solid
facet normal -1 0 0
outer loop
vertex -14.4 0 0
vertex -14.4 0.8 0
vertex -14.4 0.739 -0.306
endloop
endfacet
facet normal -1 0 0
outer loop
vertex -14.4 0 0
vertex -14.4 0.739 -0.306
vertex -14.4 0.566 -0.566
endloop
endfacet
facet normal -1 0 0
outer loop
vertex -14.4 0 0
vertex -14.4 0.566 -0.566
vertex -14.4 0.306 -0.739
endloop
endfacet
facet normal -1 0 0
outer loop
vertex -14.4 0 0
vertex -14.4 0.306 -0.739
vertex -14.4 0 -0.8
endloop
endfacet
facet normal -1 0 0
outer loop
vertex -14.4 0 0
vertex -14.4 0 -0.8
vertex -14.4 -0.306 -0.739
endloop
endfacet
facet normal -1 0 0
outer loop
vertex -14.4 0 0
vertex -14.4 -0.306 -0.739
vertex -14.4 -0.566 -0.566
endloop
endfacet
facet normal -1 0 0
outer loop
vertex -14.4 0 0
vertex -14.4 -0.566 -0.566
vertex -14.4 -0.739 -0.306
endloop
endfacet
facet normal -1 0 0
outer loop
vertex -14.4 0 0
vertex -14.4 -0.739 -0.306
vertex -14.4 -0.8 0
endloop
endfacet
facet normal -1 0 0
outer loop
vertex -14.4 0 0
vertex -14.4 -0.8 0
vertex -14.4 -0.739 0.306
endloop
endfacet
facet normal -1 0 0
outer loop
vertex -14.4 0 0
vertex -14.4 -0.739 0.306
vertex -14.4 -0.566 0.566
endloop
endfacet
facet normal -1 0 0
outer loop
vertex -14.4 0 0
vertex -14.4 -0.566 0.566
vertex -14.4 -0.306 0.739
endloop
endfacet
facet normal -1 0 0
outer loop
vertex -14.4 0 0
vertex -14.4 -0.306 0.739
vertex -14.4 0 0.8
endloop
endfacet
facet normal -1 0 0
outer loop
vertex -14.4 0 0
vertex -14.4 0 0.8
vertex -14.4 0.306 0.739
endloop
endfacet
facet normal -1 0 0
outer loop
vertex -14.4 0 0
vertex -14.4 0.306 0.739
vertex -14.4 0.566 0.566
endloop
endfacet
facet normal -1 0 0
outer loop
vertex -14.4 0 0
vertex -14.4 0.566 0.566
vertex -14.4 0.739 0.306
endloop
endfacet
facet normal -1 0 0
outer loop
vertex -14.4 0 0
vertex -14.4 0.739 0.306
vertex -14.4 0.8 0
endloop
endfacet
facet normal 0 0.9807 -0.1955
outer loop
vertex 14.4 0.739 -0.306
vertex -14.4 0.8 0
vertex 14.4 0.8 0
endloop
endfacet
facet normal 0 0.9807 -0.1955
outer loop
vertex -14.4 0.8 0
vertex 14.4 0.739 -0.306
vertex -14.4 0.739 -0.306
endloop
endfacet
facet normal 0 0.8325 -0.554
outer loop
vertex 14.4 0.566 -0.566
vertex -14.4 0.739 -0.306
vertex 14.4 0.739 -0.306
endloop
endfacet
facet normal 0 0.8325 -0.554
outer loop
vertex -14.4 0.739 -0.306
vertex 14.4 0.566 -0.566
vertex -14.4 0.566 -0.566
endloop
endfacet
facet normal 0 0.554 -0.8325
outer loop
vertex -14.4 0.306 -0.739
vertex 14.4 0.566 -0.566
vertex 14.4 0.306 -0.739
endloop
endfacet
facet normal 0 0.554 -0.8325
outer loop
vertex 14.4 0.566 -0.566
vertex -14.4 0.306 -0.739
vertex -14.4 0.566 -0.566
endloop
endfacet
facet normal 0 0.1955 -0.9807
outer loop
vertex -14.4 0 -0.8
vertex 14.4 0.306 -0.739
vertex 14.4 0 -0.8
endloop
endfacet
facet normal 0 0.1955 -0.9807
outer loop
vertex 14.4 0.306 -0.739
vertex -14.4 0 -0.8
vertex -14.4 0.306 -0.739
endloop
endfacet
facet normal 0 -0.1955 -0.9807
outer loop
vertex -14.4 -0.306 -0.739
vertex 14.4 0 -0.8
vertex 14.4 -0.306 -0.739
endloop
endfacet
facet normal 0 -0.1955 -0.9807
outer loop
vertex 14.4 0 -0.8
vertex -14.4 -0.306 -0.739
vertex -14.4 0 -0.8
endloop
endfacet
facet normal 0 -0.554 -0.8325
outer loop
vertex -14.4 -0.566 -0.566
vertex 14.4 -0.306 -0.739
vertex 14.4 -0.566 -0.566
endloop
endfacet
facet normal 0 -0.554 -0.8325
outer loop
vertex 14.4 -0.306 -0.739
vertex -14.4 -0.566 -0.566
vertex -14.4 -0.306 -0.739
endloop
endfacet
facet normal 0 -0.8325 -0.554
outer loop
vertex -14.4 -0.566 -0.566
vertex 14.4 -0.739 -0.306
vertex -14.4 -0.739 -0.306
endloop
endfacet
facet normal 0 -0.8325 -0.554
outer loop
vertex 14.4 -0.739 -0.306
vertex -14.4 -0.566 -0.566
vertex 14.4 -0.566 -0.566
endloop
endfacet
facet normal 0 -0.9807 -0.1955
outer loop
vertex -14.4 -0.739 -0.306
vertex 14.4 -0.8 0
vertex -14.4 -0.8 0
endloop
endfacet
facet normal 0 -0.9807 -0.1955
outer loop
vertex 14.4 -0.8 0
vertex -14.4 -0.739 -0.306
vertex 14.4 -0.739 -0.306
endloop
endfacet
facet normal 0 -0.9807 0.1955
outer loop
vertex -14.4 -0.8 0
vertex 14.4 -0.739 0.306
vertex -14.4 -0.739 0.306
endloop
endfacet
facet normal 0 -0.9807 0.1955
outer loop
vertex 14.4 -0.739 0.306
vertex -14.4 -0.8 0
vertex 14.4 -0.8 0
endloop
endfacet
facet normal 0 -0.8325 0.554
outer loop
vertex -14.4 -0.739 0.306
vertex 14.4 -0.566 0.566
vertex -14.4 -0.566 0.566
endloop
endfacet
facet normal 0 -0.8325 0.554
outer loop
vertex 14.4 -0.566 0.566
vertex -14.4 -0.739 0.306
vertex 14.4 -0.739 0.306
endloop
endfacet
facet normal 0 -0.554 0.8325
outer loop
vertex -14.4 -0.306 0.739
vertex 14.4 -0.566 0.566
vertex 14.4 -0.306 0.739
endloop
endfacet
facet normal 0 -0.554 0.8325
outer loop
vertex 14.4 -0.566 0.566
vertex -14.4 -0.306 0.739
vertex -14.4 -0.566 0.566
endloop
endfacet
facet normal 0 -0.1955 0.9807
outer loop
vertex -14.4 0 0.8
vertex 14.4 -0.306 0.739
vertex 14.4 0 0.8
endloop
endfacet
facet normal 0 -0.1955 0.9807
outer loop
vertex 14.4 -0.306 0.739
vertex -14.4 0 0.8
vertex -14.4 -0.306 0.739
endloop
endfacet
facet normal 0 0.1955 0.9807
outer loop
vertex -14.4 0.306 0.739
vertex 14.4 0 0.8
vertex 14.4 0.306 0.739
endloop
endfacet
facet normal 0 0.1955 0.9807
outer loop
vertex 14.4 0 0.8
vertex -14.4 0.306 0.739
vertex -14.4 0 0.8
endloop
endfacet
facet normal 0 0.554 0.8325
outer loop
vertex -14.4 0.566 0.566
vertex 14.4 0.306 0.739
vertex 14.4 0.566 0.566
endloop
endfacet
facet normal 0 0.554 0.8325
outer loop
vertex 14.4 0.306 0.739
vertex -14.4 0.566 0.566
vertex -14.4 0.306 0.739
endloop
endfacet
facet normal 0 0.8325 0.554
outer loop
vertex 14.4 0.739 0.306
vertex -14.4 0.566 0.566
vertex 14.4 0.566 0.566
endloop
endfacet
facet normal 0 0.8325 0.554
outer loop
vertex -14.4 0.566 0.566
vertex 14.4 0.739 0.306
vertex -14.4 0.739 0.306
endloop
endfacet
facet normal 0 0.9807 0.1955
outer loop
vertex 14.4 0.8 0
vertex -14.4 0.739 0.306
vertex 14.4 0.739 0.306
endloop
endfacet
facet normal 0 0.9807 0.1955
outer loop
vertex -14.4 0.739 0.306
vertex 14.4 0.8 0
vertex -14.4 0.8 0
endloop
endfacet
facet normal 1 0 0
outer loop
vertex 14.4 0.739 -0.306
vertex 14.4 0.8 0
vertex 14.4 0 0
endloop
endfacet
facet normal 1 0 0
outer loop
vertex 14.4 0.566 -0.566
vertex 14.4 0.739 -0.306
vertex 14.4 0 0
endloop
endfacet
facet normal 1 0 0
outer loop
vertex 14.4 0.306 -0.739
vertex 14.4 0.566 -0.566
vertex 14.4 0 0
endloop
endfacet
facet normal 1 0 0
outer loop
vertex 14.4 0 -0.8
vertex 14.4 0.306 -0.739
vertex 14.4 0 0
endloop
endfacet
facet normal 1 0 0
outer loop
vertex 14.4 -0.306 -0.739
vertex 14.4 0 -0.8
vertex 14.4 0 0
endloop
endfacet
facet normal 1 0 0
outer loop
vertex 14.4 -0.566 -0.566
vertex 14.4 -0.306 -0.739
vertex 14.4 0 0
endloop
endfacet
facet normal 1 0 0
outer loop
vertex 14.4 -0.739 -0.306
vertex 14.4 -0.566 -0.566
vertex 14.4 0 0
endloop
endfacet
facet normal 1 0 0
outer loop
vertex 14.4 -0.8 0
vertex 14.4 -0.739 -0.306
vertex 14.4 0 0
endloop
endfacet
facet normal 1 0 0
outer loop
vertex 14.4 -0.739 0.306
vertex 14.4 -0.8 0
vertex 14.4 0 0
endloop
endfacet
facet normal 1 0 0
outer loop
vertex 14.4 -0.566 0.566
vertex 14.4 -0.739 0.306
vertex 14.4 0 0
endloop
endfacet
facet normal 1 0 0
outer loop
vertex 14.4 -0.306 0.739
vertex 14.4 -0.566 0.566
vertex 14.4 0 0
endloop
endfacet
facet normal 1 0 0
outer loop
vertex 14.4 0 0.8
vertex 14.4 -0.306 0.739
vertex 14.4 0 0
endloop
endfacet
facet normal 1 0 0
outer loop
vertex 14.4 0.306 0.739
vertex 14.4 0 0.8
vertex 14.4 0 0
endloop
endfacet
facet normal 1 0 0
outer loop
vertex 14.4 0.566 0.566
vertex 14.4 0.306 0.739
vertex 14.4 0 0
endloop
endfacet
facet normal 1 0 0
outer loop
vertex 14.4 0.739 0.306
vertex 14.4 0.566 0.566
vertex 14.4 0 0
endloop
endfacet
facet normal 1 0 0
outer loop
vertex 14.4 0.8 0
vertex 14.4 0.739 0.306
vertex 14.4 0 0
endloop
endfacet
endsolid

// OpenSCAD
// file: ../p/4-4edge.scad
use <../lib.scad>
function ldraw_lib__4_4edge() = [
// 0 Circle 1.0
// 0 Name: 4-4edge.dat
// 0 Author: James Jessiman
// 0 !LDRAW_ORG Primitive UPDATE 2017-01
// 0 !LICENSE Licensed under CC BY 2.0 and CC BY 4.0 : see CAreadme.txt
// 
// 0 BFC CERTIFY CCW
  [0,"BFC","CERTIFY"],
  [0,"BFC","CCW"],
// 
// 0 !HISTORY 1998-12-15 [PTadmin] Official Update 1998-10
// 0 !HISTORY 2005-12-28 [PTadmin] Official Update 2005-01
// 0 !HISTORY 2007-06-24 [PTadmin] Header formatted for Contributor Agreement
// 0 !HISTORY 2008-07-01 [PTadmin] Official Update 2008-01
// 0 !HISTORY 2017-01-15 [Steffen] BFCed
// 0 !HISTORY 2017-12-30 [PTadmin] Official Update 2017-01
// 
// 
// 2 24 1 0 0 0.9239 0 0.3827
  [2,24,1,0,0,0.9239,0,0.3827],
// 2 24 0.9239 0 0.3827 0.7071 0 0.7071
  [2,24,0.9239,0,0.3827,0.7071,0,0.7071],
// 2 24 0.7071 0 0.7071 0.3827 0 0.9239
  [2,24,0.7071,0,0.7071,0.3827,0,0.9239],
// 2 24 0.3827 0 0.9239 0 0 1
  [2,24,0.3827,0,0.9239,0,0,1],
// 2 24 0 0 1 -0.3827 0 0.9239
  [2,24,0,0,1,-0.3827,0,0.9239],
// 2 24 -0.3827 0 0.9239 -0.7071 0 0.7071
  [2,24,-0.3827,0,0.9239,-0.7071,0,0.7071],
// 2 24 -0.7071 0 0.7071 -0.9239 0 0.3827
  [2,24,-0.7071,0,0.7071,-0.9239,0,0.3827],
// 2 24 -0.9239 0 0.3827 -1 0 -0
  [2,24,-0.9239,0,0.3827,-1,0,-0],
// 2 24 -1 0 -0 -0.9239 0 -0.3827
  [2,24,-1,0,-0,-0.9239,0,-0.3827],
// 2 24 -0.9239 0 -0.3827 -0.7071 0 -0.7071
  [2,24,-0.9239,0,-0.3827,-0.7071,0,-0.7071],
// 2 24 -0.7071 0 -0.7071 -0.3827 0 -0.9239
  [2,24,-0.7071,0,-0.7071,-0.3827,0,-0.9239],
// 2 24 -0.3827 0 -0.9239 0 0 -1
  [2,24,-0.3827,0,-0.9239,0,0,-1],
// 2 24 0 0 -1 0.3827 0 -0.9239
  [2,24,0,0,-1,0.3827,0,-0.9239],
// 2 24 0.3827 0 -0.9239 0.7071 0 -0.7071
  [2,24,0.3827,0,-0.9239,0.7071,0,-0.7071],
// 2 24 0.7071 0 -0.7071 0.9239 0 -0.3827
  [2,24,0.7071,0,-0.7071,0.9239,0,-0.3827],
// 2 24 0.9239 0 -0.3827 1 0 0
  [2,24,0.9239,0,-0.3827,1,0,0],
];
makepoly(ldraw_lib__4_4edge(), line=0.2);
// file: ../p/4-4cyli.scad
use <../lib.scad>
function ldraw_lib__4_4cyli() = [
// 0 Cylinder 1.0
// 0 Name: 4-4cyli.dat
// 0 Author: James Jessiman
// 0 !LDRAW_ORG Primitive UPDATE 2005-01
// 0 !LICENSE Licensed under CC BY 2.0 and CC BY 4.0 : see CAreadme.txt
// 
// 0 BFC CERTIFY CCW
  [0,"BFC","CERTIFY"],
  [0,"BFC","CCW"],
// 
// 0 !HISTORY 1998-12-15 [PTadmin] Official Update 1998-10
// 0 !HISTORY 2002-03-23 [sbliss] Added BFC statement; merged headers from files in distributions LDraw 0.27 and Complete.
// 0 !HISTORY 2002-04-25 [PTadmin] Official Update 2002-02
// 0 !HISTORY 2004-12-14 [guyvivan] BFC CCW
// 0 !HISTORY 2005-12-28 [PTadmin] Official Update 2005-01
// 0 !HISTORY 2007-06-24 [PTadmin] Header formatted for Contributor Agreement
// 0 !HISTORY 2008-07-01 [PTadmin] Official Update 2008-01
// 
// 
// 4 16 1 1 0 0.9239 1 0.3827 0.9239 0 0.3827 1 0 0
  [4,16,1,1,0,0.9239,1,0.3827,0.9239,0,0.3827,1,0,0],
// 5 24 1 0 0 1 1 0 0.9239 0 0.3827 0.9239 0 -0.3827
  [5,24,1,0,0,1,1,0,0.9239,0,0.3827,0.9239,0,-0.3827],
// 4 16 0.9239 1 0.3827 0.7071 1 0.7071 0.7071 0 0.7071 0.9239 0 0.3827
  [4,16,0.9239,1,0.3827,0.7071,1,0.7071,0.7071,0,0.7071,0.9239,0,0.3827],
// 5 24 0.9239 0 0.3827 0.9239 1 0.3827 0.7071 0 0.7071 1 0 0
  [5,24,0.9239,0,0.3827,0.9239,1,0.3827,0.7071,0,0.7071,1,0,0],
// 4 16 0.7071 1 0.7071 0.3827 1 0.9239 0.3827 0 0.9239 0.7071 0 0.7071
  [4,16,0.7071,1,0.7071,0.3827,1,0.9239,0.3827,0,0.9239,0.7071,0,0.7071],
// 5 24 0.7071 0 0.7071 0.7071 1 0.7071 0.3827 0 0.9239 0.9239 0 0.3827
  [5,24,0.7071,0,0.7071,0.7071,1,0.7071,0.3827,0,0.9239,0.9239,0,0.3827],
// 4 16 0.3827 1 0.9239 0 1 1 0 0 1 0.3827 0 0.9239
  [4,16,0.3827,1,0.9239,0,1,1,0,0,1,0.3827,0,0.9239],
// 5 24 0.3827 0 0.9239 0.3827 1 0.9239 0 0 1 0.7071 0 0.7071
  [5,24,0.3827,0,0.9239,0.3827,1,0.9239,0,0,1,0.7071,0,0.7071],
// 4 16 0 1 1 -0.3827 1 0.9239 -0.3827 0 0.9239 0 0 1
  [4,16,0,1,1,-0.3827,1,0.9239,-0.3827,0,0.9239,0,0,1],
// 5 24 0 0 1 0 1 1 -0.3827 0 0.9239 0.3827 0 0.9239
  [5,24,0,0,1,0,1,1,-0.3827,0,0.9239,0.3827,0,0.9239],
// 4 16 -0.3827 1 0.9239 -0.7071 1 0.7071 -0.7071 0 0.7071 -0.3827 0 0.9239
  [4,16,-0.3827,1,0.9239,-0.7071,1,0.7071,-0.7071,0,0.7071,-0.3827,0,0.9239],
// 5 24 -0.3827 0 0.9239 -0.3827 1 0.9239 -0.7071 0 0.7071 0 0 1
  [5,24,-0.3827,0,0.9239,-0.3827,1,0.9239,-0.7071,0,0.7071,0,0,1],
// 4 16 -0.7071 1 0.7071 -0.9239 1 0.3827 -0.9239 0 0.3827 -0.7071 0 0.7071
  [4,16,-0.7071,1,0.7071,-0.9239,1,0.3827,-0.9239,0,0.3827,-0.7071,0,0.7071],
// 5 24 -0.7071 0 0.7071 -0.7071 1 0.7071 -0.9239 0 0.3827 -0.3827 0 0.9239
  [5,24,-0.7071,0,0.7071,-0.7071,1,0.7071,-0.9239,0,0.3827,-0.3827,0,0.9239],
// 4 16 -0.9239 1 0.3827 -1 1 0 -1 0 0 -0.9239 0 0.3827
  [4,16,-0.9239,1,0.3827,-1,1,0,-1,0,0,-0.9239,0,0.3827],
// 5 24 -0.9239 0 0.3827 -0.9239 1 0.3827 -1 0 0 -0.7071 0 0.7071
  [5,24,-0.9239,0,0.3827,-0.9239,1,0.3827,-1,0,0,-0.7071,0,0.7071],
// 4 16 -1 1 0 -0.9239 1 -0.3827 -0.9239 0 -0.3827 -1 0 0
  [4,16,-1,1,0,-0.9239,1,-0.3827,-0.9239,0,-0.3827,-1,0,0],
// 5 24 -1 0 0 -1 1 0 -0.9239 0 -0.3827 -0.9239 0 0.3827
  [5,24,-1,0,0,-1,1,0,-0.9239,0,-0.3827,-0.9239,0,0.3827],
// 4 16 -0.9239 1 -0.3827 -0.7071 1 -0.7071 -0.7071 0 -0.7071 -0.9239 0 -0.3827
  [4,16,-0.9239,1,-0.3827,-0.7071,1,-0.7071,-0.7071,0,-0.7071,-0.9239,0,-0.3827],
// 5 24 -0.9239 0 -0.3827 -0.9239 1 -0.3827 -0.7071 0 -0.7071 -1 0 0
  [5,24,-0.9239,0,-0.3827,-0.9239,1,-0.3827,-0.7071,0,-0.7071,-1,0,0],
// 4 16 -0.7071 1 -0.7071 -0.3827 1 -0.9239 -0.3827 0 -0.9239 -0.7071 0 -0.7071
  [4,16,-0.7071,1,-0.7071,-0.3827,1,-0.9239,-0.3827,0,-0.9239,-0.7071,0,-0.7071],
// 5 24 -0.7071 0 -0.7071 -0.7071 1 -0.7071 -0.3827 0 -0.9239 -0.9239 0 -0.3827
  [5,24,-0.7071,0,-0.7071,-0.7071,1,-0.7071,-0.3827,0,-0.9239,-0.9239,0,-0.3827],
// 4 16 -0.3827 1 -0.9239 0 1 -1 0 0 -1 -0.3827 0 -0.9239
  [4,16,-0.3827,1,-0.9239,0,1,-1,0,0,-1,-0.3827,0,-0.9239],
// 5 24 -0.3827 0 -0.9239 -0.3827 1 -0.9239 0 0 -1 -0.7071 0 -0.7071
  [5,24,-0.3827,0,-0.9239,-0.3827,1,-0.9239,0,0,-1,-0.7071,0,-0.7071],
// 4 16 0 1 -1 0.3827 1 -0.9239 0.3827 0 -0.9239 0 0 -1
  [4,16,0,1,-1,0.3827,1,-0.9239,0.3827,0,-0.9239,0,0,-1],
// 5 24 0 0 -1 0 1 -1 0.3827 0 -0.9239 -0.3827 0 -0.9239
  [5,24,0,0,-1,0,1,-1,0.3827,0,-0.9239,-0.3827,0,-0.9239],
// 4 16 0.3827 1 -0.9239 0.7071 1 -0.7071 0.7071 0 -0.7071 0.3827 0 -0.9239
  [4,16,0.3827,1,-0.9239,0.7071,1,-0.7071,0.7071,0,-0.7071,0.3827,0,-0.9239],
// 5 24 0.3827 0 -0.9239 0.3827 1 -0.9239 0.7071 0 -0.7071 0 0 -1
  [5,24,0.3827,0,-0.9239,0.3827,1,-0.9239,0.7071,0,-0.7071,0,0,-1],
// 4 16 0.7071 1 -0.7071 0.9239 1 -0.3827 0.9239 0 -0.3827 0.7071 0 -0.7071
  [4,16,0.7071,1,-0.7071,0.9239,1,-0.3827,0.9239,0,-0.3827,0.7071,0,-0.7071],
// 5 24 0.7071 0 -0.7071 0.7071 1 -0.7071 0.9239 0 -0.3827 0.3827 0 -0.9239
  [5,24,0.7071,0,-0.7071,0.7071,1,-0.7071,0.9239,0,-0.3827,0.3827,0,-0.9239],
// 4 16 0.9239 1 -0.3827 1 1 0 1 0 0 0.9239 0 -0.3827
  [4,16,0.9239,1,-0.3827,1,1,0,1,0,0,0.9239,0,-0.3827],
// 5 24 0.9239 0 -0.3827 0.9239 1 -0.3827 1 0 0 0.7071 0 -0.7071
  [5,24,0.9239,0,-0.3827,0.9239,1,-0.3827,1,0,0,0.7071,0,-0.7071],
// 0
];
makepoly(ldraw_lib__4_4cyli(), line=0.2);
// file: ../p/4-4disc.scad
use <../lib.scad>
function ldraw_lib__4_4disc() = [
// 0 Disc 1.0
// 0 Name: 4-4disc.dat
// 0 Author: James Jessiman
// 0 !LDRAW_ORG Primitive UPDATE 2002-02
// 0 !LICENSE Licensed under CC BY 2.0 and CC BY 4.0 : see CAreadme.txt
// 
// 0 BFC CERTIFY CCW
  [0,"BFC","CERTIFY"],
  [0,"BFC","CCW"],
// 
// 0 !HISTORY 1998-12-15 [PTadmin] Official Update 1998-10
// 0 !HISTORY 2002-03-23 [sbliss] Added BFC statement
// 0 !HISTORY 2002-04-25 [PTadmin] Official Update 2002-02
// 0 !HISTORY 2007-06-24 [PTadmin] Header formatted for Contributor Agreement
// 0 !HISTORY 2008-07-01 [PTadmin] Official Update 2008-01
// 
// 
// 3 16 0 0 0 1 0 0 0.9239 0 0.3827
  [3,16,0,0,0,1,0,0,0.9239,0,0.3827],
// 3 16 0 0 0 0.9239 0 0.3827 0.7071 0 0.7071
  [3,16,0,0,0,0.9239,0,0.3827,0.7071,0,0.7071],
// 3 16 0 0 0 0.7071 0 0.7071 0.3827 0 0.9239
  [3,16,0,0,0,0.7071,0,0.7071,0.3827,0,0.9239],
// 3 16 0 0 0 0.3827 0 0.9239 0 0 1
  [3,16,0,0,0,0.3827,0,0.9239,0,0,1],
// 3 16 0 0 0 0 0 1 -0.3827 0 0.9239
  [3,16,0,0,0,0,0,1,-0.3827,0,0.9239],
// 3 16 0 0 0 -0.3827 0 0.9239 -0.7071 0 0.7071
  [3,16,0,0,0,-0.3827,0,0.9239,-0.7071,0,0.7071],
// 3 16 0 0 0 -0.7071 0 0.7071 -0.9239 0 0.3827
  [3,16,0,0,0,-0.7071,0,0.7071,-0.9239,0,0.3827],
// 3 16 0 0 0 -0.9239 0 0.3827 -1 0 -0
  [3,16,0,0,0,-0.9239,0,0.3827,-1,0,-0],
// 3 16 0 0 0 -1 0 -0 -0.9239 0 -0.3827
  [3,16,0,0,0,-1,0,-0,-0.9239,0,-0.3827],
// 3 16 0 0 0 -0.9239 0 -0.3827 -0.7071 0 -0.7071
  [3,16,0,0,0,-0.9239,0,-0.3827,-0.7071,0,-0.7071],
// 3 16 0 0 0 -0.7071 0 -0.7071 -0.3827 0 -0.9239
  [3,16,0,0,0,-0.7071,0,-0.7071,-0.3827,0,-0.9239],
// 3 16 0 0 0 -0.3827 0 -0.9239 0 0 -1
  [3,16,0,0,0,-0.3827,0,-0.9239,0,0,-1],
// 3 16 0 0 0 0 0 -1 0.3827 0 -0.9239
  [3,16,0,0,0,0,0,-1,0.3827,0,-0.9239],
// 3 16 0 0 0 0.3827 0 -0.9239 0.7071 0 -0.7071
  [3,16,0,0,0,0.3827,0,-0.9239,0.7071,0,-0.7071],
// 3 16 0 0 0 0.7071 0 -0.7071 0.9239 0 -0.3827
  [3,16,0,0,0,0.7071,0,-0.7071,0.9239,0,-0.3827],
// 3 16 0 0 0 0.9239 0 -0.3827 1 0 0
  [3,16,0,0,0,0.9239,0,-0.3827,1,0,0],
// 0
];
makepoly(ldraw_lib__4_4disc(), line=0.2);
// file: ../p/4-4cylc.scad
use <../lib.scad>
use <4-4cyli.scad>
use <4-4disc.scad>
use <4-4edge.scad>
function ldraw_lib__4_4cylc() = [
// 0 Cylinder Closed 1.0
// 0 Name: 4-4cylc.dat
// 0 Author: Alex Taylor [anathema]
// 0 !LDRAW_ORG Primitive UPDATE 2009-02
// 0 !LICENSE Licensed under CC BY 2.0 and CC BY 4.0 : see CAreadme.txt
// 
// 0 BFC CERTIFY CCW
  [0,"BFC","CERTIFY"],
  [0,"BFC","CCW"],
// 
// 0 !HISTORY 2008-12-29 [cwdee] Removed one disc
// 0 !HISTORY 2009-09-03 [PTadmin] Official Update 2009-02
// 
// 
// 1 16 0 0 0 1 0 0 0 1 0 0 0 1 4-4edge.dat
  [1,16,0,0,0,1,0,0,0,1,0,0,0,1, ldraw_lib__4_4edge()],
// 1 16 0 1 0 1 0 0 0 1 0 0 0 1 4-4edge.dat
  [1,16,0,1,0,1,0,0,0,1,0,0,0,1, ldraw_lib__4_4edge()],
// 1 16 0 0 0 1 0 0 0 1 0 0 0 1 4-4disc.dat
  [1,16,0,0,0,1,0,0,0,1,0,0,0,1, ldraw_lib__4_4disc()],
// 1 16 0 0 0 1 0 0 0 1 0 0 0 1 4-4cyli.dat
  [1,16,0,0,0,1,0,0,0,1,0,0,0,1, ldraw_lib__4_4cyli()],
// 0
];
makepoly(ldraw_lib__4_4cylc(), line=0.2);
// main file
use <../lib.scad>
use <../p/4-4cylc.scad>
use <../p/4-4disc.scad>
function ldraw_lib__u9132() = [
// 0 ~Axle Steel  4 x 72 LDU
// 0 Name: u9132.dat
// 0 Author: Steffen [Steffen]
// 0 !LDRAW_ORG Part UPDATE 2011-02
// 0 !LICENSE Licensed under CC BY 2.0 and CC BY 4.0 : see CAreadme.txt
// 
// 0 BFC CERTIFY CCW
  [0,"BFC","CERTIFY"],
  [0,"BFC","CCW"],
// 
// 0 !CATEGORY Wheel
// 
// 0 !HISTORY 2011-12-29 [PTadmin] Official Update 2011-02
// 
// 
// 1 16 -36 0 0 0 72 0 0 0 2 2 0 0 4-4cylc.dat
  [1,16,-36,0,0,0,72,0,0,0,2,2,0,0, ldraw_lib__4_4cylc()],
// 1 16 36 0 0 0 -1 0 0 0 2 2 0 0 4-4disc.dat
  [1,16,36,0,0,0,-1,0,0,0,2,2,0,0, ldraw_lib__4_4disc()],
];
makepoly(ldraw_lib__u9132(), line=0.2);
